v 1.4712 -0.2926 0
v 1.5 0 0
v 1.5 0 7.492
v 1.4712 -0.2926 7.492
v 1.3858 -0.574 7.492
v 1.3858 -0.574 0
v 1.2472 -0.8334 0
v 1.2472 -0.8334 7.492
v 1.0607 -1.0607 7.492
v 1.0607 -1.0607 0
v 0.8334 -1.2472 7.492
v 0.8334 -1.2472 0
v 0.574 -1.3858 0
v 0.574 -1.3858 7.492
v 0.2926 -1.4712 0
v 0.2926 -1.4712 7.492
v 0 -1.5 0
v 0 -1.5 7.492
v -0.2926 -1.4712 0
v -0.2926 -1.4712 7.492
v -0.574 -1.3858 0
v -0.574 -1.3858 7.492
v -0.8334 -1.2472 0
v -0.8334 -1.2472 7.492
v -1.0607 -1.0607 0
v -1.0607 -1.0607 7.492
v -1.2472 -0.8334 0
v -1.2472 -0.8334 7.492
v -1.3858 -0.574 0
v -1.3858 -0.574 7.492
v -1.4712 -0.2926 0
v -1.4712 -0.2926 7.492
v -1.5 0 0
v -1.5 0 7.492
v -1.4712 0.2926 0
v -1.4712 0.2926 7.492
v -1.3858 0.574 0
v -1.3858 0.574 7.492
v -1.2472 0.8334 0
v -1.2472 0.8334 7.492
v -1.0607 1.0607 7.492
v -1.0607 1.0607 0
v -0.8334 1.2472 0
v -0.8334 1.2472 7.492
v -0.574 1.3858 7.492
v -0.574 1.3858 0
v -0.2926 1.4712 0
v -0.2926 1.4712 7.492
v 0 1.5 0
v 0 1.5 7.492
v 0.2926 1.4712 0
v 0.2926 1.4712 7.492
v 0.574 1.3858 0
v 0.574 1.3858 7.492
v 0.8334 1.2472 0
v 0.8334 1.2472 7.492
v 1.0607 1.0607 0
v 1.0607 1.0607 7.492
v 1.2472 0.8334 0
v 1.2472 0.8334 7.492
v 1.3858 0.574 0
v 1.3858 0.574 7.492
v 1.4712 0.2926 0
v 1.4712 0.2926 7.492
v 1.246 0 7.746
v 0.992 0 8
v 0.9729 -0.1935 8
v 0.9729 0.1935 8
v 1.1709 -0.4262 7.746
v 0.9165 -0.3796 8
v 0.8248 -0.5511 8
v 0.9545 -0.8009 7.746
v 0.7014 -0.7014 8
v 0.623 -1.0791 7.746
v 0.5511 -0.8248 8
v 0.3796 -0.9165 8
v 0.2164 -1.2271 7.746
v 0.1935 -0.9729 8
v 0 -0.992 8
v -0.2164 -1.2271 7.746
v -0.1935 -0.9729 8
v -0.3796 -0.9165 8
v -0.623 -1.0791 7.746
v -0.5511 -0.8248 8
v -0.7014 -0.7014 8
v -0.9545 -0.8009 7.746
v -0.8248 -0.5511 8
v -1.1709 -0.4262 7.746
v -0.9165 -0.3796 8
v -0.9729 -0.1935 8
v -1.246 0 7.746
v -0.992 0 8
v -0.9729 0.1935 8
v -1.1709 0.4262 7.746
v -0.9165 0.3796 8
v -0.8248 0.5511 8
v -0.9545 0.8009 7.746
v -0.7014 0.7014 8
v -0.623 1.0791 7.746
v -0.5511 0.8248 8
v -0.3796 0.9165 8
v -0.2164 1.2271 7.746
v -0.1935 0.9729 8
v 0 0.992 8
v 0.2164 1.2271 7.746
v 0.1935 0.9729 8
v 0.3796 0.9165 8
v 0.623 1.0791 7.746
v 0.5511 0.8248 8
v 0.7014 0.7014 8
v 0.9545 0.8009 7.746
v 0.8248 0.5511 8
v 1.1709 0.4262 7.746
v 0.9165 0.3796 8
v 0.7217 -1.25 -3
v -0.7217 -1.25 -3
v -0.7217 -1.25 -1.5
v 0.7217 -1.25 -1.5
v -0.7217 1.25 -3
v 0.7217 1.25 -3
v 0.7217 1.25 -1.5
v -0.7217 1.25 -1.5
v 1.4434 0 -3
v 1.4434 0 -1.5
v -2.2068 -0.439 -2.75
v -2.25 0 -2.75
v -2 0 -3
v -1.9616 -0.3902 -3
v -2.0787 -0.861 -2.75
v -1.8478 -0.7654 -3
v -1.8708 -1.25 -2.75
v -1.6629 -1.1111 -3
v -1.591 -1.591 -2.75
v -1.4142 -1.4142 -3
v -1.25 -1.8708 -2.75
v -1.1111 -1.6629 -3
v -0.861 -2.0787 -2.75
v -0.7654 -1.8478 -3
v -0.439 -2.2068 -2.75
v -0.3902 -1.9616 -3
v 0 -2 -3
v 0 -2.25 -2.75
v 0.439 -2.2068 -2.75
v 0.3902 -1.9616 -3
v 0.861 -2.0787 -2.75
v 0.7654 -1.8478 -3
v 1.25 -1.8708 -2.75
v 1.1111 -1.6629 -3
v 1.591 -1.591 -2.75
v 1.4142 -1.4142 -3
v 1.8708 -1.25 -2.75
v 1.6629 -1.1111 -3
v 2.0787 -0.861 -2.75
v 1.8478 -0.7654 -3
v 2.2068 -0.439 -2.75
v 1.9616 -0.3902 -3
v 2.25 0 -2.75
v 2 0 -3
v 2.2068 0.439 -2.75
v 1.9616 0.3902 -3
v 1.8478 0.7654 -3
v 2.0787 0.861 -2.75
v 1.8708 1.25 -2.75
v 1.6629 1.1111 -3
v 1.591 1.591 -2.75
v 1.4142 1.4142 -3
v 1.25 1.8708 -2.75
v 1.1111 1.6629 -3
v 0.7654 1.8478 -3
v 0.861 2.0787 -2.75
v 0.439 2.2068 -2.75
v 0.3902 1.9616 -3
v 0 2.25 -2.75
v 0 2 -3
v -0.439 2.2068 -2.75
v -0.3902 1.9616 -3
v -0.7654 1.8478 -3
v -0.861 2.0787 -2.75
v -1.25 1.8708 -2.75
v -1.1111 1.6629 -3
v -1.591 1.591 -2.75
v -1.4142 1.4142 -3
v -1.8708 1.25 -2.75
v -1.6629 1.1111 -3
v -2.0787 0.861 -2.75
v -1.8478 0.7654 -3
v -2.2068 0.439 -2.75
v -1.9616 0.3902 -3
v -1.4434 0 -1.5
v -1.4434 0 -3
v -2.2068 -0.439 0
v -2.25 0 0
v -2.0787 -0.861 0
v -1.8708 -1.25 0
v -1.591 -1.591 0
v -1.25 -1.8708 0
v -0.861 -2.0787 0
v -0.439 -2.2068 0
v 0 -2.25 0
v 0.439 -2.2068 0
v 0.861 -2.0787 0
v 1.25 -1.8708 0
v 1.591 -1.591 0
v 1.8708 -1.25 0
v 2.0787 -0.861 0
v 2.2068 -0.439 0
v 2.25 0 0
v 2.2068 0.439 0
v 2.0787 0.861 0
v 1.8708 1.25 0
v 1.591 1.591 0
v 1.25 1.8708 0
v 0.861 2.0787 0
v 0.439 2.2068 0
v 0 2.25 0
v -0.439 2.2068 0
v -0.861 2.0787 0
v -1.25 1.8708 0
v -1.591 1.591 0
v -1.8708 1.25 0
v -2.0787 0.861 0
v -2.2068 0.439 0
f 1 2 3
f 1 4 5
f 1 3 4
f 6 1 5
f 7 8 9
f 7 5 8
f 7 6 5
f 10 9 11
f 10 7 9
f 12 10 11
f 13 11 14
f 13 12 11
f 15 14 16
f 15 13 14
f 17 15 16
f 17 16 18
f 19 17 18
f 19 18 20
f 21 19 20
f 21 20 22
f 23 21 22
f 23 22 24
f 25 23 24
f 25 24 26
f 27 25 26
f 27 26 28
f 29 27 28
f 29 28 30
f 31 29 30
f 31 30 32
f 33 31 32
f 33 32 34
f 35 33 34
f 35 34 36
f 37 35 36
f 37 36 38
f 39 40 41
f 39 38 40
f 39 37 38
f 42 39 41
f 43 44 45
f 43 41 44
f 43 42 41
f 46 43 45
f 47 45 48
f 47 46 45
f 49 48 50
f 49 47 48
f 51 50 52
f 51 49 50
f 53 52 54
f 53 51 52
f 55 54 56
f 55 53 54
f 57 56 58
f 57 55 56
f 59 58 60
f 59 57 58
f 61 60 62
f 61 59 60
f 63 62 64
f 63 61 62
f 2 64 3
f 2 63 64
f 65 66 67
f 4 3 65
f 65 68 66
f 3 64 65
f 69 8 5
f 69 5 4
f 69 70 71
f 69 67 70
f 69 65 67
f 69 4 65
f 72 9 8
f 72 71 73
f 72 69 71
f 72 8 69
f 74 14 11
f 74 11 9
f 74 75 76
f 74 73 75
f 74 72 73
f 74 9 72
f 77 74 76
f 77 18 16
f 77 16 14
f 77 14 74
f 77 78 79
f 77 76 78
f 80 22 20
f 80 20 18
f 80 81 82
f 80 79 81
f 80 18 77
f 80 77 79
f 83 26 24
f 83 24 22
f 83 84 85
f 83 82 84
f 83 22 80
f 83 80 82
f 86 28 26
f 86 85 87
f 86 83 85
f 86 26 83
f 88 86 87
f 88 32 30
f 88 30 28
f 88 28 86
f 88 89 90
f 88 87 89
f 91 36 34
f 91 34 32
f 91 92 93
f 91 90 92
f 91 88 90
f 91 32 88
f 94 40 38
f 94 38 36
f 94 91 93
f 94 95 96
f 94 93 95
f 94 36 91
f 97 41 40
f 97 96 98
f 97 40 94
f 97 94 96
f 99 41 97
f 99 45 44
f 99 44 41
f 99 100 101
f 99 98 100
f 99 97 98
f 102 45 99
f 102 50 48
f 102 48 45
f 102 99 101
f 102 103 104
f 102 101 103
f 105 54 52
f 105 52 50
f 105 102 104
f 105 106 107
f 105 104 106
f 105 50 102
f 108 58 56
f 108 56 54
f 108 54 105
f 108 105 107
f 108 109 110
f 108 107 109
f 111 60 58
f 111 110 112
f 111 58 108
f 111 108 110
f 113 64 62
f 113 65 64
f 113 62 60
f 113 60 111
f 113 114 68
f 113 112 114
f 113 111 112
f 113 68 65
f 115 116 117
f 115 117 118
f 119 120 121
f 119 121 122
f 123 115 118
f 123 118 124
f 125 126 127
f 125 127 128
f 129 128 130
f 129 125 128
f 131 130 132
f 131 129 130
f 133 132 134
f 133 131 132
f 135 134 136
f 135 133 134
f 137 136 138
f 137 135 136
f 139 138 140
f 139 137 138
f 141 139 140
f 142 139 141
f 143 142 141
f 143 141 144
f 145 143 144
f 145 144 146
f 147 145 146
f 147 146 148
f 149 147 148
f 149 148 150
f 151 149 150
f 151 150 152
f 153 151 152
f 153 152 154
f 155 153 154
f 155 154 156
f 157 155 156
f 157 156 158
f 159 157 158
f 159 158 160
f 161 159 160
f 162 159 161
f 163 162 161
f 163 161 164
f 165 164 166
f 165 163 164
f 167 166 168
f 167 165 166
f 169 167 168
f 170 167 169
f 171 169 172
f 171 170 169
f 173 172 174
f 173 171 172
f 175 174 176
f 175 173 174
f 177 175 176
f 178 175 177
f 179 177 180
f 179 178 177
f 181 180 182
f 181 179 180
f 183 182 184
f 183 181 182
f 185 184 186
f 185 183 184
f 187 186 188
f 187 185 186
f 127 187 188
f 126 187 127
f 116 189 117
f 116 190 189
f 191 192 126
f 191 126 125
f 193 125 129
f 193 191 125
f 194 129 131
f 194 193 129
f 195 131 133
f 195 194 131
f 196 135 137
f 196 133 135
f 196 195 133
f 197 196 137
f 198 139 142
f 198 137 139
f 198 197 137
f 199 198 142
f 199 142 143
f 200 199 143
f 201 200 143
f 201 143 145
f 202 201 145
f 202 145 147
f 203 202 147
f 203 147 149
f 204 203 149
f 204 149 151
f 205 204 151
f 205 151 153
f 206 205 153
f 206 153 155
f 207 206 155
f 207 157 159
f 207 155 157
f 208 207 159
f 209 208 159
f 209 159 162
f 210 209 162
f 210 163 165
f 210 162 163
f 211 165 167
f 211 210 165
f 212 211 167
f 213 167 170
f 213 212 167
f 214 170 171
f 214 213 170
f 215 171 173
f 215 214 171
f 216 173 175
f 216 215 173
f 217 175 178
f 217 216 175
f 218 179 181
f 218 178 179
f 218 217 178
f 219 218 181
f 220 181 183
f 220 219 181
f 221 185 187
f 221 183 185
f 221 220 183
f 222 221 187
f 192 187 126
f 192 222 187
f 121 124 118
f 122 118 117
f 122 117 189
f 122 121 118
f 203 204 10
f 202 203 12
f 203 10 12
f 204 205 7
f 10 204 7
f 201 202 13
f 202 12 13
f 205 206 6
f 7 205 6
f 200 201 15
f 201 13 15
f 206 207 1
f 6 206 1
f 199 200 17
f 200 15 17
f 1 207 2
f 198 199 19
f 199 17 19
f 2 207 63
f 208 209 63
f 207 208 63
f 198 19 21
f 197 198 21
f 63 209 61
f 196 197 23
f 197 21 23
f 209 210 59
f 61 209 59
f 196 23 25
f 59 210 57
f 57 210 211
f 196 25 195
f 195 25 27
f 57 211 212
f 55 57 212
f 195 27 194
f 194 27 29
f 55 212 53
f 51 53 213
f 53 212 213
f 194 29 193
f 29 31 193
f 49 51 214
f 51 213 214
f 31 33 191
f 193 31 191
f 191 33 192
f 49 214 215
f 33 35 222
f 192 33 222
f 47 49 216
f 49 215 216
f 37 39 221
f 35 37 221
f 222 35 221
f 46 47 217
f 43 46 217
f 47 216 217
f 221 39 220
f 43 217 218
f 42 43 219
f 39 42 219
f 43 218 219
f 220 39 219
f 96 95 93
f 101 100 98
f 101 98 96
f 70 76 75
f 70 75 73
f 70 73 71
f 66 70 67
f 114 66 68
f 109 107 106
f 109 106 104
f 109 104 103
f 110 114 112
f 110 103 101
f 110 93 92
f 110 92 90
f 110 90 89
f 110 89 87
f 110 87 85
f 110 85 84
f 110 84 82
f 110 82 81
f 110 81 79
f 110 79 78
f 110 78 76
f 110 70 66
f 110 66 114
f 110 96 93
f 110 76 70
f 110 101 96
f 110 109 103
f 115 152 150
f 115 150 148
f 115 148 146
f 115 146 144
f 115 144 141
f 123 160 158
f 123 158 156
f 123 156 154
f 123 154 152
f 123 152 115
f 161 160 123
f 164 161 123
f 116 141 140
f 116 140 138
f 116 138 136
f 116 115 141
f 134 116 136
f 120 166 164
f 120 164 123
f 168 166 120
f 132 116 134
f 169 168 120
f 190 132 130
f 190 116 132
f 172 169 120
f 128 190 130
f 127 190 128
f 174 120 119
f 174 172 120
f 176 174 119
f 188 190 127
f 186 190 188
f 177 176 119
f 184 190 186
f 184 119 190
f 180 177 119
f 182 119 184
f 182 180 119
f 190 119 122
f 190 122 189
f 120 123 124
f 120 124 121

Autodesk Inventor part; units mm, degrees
ref_plane "YZ Plane" through (0, 0, 0) normal (1, 0, 0) x (0, 1, 0)
ref_plane "XZ Plane" through (0, 0, 0) normal (0, 1, 0) x (-1, 0, 0)
ref_plane "XY Plane" through (0, 0, 0) normal (0, 0, 1) x (1, 0, 0)
sketch "Sketch1" plane through (0, 0, 0) normal (0, 0, 1) x (1, 0, 0)
  circle A0 centre (0, 0) radius 1.5
  dimension "d0" = 3
extrude "Extrusion1" add sketch "Sketch1" along normal blind 8
sketch "Sketch2" plane through (0, 0, 0) normal (0, 0, -1) x (-1, 0, 0)
  circle A0 centre (0, 0) radius 1.5 projected
  circle A1 centre (0, 0) radius 2.25
  dimension "d3" = 4.5
extrude "Extrusion2" add sketch "Sketch2" along normal blind 3 contours A0 | A1
sketch "Sketch3" plane through (0, 0, -3) normal (0, 0, -1) x (-1, 0, 0)
  circle A0 centre (0, 0) radius 2.25 projected
  line L0 (-0.7217, 1.25) -> (0.7217, 1.25)
  line L1 (0.7217, 1.25) -> (1.4434, 0)
  line L2 (1.4434, 0) -> (0.7217, -1.25)
  line L3 (0.7217, -1.25) -> (-0.7217, -1.25)
  line L4 (-0.7217, -1.25) -> (-1.4434, 0)
  line L5 (-1.4434, 0) -> (-0.7217, 1.25)
  dimension "d6" = 2.5
extrude "Extrusion3" cut sketch "Sketch3" against normal blind 1.5 contours L0 L1 L2 L3 L4 L5
thread "Thread1" size "M3x0.5" class "6g" standard "ANSI Metric M Profile" full length
chamfer "Chamfer1" distance 0.508 angle 45 1 edges at (-1.5, 0, 8)
chamfer "Chamfer2" distance 0.25 angle 45 1 edges at (2.25, 0, -3)
properties part number "M3 SHCS x8" material "Steel"
